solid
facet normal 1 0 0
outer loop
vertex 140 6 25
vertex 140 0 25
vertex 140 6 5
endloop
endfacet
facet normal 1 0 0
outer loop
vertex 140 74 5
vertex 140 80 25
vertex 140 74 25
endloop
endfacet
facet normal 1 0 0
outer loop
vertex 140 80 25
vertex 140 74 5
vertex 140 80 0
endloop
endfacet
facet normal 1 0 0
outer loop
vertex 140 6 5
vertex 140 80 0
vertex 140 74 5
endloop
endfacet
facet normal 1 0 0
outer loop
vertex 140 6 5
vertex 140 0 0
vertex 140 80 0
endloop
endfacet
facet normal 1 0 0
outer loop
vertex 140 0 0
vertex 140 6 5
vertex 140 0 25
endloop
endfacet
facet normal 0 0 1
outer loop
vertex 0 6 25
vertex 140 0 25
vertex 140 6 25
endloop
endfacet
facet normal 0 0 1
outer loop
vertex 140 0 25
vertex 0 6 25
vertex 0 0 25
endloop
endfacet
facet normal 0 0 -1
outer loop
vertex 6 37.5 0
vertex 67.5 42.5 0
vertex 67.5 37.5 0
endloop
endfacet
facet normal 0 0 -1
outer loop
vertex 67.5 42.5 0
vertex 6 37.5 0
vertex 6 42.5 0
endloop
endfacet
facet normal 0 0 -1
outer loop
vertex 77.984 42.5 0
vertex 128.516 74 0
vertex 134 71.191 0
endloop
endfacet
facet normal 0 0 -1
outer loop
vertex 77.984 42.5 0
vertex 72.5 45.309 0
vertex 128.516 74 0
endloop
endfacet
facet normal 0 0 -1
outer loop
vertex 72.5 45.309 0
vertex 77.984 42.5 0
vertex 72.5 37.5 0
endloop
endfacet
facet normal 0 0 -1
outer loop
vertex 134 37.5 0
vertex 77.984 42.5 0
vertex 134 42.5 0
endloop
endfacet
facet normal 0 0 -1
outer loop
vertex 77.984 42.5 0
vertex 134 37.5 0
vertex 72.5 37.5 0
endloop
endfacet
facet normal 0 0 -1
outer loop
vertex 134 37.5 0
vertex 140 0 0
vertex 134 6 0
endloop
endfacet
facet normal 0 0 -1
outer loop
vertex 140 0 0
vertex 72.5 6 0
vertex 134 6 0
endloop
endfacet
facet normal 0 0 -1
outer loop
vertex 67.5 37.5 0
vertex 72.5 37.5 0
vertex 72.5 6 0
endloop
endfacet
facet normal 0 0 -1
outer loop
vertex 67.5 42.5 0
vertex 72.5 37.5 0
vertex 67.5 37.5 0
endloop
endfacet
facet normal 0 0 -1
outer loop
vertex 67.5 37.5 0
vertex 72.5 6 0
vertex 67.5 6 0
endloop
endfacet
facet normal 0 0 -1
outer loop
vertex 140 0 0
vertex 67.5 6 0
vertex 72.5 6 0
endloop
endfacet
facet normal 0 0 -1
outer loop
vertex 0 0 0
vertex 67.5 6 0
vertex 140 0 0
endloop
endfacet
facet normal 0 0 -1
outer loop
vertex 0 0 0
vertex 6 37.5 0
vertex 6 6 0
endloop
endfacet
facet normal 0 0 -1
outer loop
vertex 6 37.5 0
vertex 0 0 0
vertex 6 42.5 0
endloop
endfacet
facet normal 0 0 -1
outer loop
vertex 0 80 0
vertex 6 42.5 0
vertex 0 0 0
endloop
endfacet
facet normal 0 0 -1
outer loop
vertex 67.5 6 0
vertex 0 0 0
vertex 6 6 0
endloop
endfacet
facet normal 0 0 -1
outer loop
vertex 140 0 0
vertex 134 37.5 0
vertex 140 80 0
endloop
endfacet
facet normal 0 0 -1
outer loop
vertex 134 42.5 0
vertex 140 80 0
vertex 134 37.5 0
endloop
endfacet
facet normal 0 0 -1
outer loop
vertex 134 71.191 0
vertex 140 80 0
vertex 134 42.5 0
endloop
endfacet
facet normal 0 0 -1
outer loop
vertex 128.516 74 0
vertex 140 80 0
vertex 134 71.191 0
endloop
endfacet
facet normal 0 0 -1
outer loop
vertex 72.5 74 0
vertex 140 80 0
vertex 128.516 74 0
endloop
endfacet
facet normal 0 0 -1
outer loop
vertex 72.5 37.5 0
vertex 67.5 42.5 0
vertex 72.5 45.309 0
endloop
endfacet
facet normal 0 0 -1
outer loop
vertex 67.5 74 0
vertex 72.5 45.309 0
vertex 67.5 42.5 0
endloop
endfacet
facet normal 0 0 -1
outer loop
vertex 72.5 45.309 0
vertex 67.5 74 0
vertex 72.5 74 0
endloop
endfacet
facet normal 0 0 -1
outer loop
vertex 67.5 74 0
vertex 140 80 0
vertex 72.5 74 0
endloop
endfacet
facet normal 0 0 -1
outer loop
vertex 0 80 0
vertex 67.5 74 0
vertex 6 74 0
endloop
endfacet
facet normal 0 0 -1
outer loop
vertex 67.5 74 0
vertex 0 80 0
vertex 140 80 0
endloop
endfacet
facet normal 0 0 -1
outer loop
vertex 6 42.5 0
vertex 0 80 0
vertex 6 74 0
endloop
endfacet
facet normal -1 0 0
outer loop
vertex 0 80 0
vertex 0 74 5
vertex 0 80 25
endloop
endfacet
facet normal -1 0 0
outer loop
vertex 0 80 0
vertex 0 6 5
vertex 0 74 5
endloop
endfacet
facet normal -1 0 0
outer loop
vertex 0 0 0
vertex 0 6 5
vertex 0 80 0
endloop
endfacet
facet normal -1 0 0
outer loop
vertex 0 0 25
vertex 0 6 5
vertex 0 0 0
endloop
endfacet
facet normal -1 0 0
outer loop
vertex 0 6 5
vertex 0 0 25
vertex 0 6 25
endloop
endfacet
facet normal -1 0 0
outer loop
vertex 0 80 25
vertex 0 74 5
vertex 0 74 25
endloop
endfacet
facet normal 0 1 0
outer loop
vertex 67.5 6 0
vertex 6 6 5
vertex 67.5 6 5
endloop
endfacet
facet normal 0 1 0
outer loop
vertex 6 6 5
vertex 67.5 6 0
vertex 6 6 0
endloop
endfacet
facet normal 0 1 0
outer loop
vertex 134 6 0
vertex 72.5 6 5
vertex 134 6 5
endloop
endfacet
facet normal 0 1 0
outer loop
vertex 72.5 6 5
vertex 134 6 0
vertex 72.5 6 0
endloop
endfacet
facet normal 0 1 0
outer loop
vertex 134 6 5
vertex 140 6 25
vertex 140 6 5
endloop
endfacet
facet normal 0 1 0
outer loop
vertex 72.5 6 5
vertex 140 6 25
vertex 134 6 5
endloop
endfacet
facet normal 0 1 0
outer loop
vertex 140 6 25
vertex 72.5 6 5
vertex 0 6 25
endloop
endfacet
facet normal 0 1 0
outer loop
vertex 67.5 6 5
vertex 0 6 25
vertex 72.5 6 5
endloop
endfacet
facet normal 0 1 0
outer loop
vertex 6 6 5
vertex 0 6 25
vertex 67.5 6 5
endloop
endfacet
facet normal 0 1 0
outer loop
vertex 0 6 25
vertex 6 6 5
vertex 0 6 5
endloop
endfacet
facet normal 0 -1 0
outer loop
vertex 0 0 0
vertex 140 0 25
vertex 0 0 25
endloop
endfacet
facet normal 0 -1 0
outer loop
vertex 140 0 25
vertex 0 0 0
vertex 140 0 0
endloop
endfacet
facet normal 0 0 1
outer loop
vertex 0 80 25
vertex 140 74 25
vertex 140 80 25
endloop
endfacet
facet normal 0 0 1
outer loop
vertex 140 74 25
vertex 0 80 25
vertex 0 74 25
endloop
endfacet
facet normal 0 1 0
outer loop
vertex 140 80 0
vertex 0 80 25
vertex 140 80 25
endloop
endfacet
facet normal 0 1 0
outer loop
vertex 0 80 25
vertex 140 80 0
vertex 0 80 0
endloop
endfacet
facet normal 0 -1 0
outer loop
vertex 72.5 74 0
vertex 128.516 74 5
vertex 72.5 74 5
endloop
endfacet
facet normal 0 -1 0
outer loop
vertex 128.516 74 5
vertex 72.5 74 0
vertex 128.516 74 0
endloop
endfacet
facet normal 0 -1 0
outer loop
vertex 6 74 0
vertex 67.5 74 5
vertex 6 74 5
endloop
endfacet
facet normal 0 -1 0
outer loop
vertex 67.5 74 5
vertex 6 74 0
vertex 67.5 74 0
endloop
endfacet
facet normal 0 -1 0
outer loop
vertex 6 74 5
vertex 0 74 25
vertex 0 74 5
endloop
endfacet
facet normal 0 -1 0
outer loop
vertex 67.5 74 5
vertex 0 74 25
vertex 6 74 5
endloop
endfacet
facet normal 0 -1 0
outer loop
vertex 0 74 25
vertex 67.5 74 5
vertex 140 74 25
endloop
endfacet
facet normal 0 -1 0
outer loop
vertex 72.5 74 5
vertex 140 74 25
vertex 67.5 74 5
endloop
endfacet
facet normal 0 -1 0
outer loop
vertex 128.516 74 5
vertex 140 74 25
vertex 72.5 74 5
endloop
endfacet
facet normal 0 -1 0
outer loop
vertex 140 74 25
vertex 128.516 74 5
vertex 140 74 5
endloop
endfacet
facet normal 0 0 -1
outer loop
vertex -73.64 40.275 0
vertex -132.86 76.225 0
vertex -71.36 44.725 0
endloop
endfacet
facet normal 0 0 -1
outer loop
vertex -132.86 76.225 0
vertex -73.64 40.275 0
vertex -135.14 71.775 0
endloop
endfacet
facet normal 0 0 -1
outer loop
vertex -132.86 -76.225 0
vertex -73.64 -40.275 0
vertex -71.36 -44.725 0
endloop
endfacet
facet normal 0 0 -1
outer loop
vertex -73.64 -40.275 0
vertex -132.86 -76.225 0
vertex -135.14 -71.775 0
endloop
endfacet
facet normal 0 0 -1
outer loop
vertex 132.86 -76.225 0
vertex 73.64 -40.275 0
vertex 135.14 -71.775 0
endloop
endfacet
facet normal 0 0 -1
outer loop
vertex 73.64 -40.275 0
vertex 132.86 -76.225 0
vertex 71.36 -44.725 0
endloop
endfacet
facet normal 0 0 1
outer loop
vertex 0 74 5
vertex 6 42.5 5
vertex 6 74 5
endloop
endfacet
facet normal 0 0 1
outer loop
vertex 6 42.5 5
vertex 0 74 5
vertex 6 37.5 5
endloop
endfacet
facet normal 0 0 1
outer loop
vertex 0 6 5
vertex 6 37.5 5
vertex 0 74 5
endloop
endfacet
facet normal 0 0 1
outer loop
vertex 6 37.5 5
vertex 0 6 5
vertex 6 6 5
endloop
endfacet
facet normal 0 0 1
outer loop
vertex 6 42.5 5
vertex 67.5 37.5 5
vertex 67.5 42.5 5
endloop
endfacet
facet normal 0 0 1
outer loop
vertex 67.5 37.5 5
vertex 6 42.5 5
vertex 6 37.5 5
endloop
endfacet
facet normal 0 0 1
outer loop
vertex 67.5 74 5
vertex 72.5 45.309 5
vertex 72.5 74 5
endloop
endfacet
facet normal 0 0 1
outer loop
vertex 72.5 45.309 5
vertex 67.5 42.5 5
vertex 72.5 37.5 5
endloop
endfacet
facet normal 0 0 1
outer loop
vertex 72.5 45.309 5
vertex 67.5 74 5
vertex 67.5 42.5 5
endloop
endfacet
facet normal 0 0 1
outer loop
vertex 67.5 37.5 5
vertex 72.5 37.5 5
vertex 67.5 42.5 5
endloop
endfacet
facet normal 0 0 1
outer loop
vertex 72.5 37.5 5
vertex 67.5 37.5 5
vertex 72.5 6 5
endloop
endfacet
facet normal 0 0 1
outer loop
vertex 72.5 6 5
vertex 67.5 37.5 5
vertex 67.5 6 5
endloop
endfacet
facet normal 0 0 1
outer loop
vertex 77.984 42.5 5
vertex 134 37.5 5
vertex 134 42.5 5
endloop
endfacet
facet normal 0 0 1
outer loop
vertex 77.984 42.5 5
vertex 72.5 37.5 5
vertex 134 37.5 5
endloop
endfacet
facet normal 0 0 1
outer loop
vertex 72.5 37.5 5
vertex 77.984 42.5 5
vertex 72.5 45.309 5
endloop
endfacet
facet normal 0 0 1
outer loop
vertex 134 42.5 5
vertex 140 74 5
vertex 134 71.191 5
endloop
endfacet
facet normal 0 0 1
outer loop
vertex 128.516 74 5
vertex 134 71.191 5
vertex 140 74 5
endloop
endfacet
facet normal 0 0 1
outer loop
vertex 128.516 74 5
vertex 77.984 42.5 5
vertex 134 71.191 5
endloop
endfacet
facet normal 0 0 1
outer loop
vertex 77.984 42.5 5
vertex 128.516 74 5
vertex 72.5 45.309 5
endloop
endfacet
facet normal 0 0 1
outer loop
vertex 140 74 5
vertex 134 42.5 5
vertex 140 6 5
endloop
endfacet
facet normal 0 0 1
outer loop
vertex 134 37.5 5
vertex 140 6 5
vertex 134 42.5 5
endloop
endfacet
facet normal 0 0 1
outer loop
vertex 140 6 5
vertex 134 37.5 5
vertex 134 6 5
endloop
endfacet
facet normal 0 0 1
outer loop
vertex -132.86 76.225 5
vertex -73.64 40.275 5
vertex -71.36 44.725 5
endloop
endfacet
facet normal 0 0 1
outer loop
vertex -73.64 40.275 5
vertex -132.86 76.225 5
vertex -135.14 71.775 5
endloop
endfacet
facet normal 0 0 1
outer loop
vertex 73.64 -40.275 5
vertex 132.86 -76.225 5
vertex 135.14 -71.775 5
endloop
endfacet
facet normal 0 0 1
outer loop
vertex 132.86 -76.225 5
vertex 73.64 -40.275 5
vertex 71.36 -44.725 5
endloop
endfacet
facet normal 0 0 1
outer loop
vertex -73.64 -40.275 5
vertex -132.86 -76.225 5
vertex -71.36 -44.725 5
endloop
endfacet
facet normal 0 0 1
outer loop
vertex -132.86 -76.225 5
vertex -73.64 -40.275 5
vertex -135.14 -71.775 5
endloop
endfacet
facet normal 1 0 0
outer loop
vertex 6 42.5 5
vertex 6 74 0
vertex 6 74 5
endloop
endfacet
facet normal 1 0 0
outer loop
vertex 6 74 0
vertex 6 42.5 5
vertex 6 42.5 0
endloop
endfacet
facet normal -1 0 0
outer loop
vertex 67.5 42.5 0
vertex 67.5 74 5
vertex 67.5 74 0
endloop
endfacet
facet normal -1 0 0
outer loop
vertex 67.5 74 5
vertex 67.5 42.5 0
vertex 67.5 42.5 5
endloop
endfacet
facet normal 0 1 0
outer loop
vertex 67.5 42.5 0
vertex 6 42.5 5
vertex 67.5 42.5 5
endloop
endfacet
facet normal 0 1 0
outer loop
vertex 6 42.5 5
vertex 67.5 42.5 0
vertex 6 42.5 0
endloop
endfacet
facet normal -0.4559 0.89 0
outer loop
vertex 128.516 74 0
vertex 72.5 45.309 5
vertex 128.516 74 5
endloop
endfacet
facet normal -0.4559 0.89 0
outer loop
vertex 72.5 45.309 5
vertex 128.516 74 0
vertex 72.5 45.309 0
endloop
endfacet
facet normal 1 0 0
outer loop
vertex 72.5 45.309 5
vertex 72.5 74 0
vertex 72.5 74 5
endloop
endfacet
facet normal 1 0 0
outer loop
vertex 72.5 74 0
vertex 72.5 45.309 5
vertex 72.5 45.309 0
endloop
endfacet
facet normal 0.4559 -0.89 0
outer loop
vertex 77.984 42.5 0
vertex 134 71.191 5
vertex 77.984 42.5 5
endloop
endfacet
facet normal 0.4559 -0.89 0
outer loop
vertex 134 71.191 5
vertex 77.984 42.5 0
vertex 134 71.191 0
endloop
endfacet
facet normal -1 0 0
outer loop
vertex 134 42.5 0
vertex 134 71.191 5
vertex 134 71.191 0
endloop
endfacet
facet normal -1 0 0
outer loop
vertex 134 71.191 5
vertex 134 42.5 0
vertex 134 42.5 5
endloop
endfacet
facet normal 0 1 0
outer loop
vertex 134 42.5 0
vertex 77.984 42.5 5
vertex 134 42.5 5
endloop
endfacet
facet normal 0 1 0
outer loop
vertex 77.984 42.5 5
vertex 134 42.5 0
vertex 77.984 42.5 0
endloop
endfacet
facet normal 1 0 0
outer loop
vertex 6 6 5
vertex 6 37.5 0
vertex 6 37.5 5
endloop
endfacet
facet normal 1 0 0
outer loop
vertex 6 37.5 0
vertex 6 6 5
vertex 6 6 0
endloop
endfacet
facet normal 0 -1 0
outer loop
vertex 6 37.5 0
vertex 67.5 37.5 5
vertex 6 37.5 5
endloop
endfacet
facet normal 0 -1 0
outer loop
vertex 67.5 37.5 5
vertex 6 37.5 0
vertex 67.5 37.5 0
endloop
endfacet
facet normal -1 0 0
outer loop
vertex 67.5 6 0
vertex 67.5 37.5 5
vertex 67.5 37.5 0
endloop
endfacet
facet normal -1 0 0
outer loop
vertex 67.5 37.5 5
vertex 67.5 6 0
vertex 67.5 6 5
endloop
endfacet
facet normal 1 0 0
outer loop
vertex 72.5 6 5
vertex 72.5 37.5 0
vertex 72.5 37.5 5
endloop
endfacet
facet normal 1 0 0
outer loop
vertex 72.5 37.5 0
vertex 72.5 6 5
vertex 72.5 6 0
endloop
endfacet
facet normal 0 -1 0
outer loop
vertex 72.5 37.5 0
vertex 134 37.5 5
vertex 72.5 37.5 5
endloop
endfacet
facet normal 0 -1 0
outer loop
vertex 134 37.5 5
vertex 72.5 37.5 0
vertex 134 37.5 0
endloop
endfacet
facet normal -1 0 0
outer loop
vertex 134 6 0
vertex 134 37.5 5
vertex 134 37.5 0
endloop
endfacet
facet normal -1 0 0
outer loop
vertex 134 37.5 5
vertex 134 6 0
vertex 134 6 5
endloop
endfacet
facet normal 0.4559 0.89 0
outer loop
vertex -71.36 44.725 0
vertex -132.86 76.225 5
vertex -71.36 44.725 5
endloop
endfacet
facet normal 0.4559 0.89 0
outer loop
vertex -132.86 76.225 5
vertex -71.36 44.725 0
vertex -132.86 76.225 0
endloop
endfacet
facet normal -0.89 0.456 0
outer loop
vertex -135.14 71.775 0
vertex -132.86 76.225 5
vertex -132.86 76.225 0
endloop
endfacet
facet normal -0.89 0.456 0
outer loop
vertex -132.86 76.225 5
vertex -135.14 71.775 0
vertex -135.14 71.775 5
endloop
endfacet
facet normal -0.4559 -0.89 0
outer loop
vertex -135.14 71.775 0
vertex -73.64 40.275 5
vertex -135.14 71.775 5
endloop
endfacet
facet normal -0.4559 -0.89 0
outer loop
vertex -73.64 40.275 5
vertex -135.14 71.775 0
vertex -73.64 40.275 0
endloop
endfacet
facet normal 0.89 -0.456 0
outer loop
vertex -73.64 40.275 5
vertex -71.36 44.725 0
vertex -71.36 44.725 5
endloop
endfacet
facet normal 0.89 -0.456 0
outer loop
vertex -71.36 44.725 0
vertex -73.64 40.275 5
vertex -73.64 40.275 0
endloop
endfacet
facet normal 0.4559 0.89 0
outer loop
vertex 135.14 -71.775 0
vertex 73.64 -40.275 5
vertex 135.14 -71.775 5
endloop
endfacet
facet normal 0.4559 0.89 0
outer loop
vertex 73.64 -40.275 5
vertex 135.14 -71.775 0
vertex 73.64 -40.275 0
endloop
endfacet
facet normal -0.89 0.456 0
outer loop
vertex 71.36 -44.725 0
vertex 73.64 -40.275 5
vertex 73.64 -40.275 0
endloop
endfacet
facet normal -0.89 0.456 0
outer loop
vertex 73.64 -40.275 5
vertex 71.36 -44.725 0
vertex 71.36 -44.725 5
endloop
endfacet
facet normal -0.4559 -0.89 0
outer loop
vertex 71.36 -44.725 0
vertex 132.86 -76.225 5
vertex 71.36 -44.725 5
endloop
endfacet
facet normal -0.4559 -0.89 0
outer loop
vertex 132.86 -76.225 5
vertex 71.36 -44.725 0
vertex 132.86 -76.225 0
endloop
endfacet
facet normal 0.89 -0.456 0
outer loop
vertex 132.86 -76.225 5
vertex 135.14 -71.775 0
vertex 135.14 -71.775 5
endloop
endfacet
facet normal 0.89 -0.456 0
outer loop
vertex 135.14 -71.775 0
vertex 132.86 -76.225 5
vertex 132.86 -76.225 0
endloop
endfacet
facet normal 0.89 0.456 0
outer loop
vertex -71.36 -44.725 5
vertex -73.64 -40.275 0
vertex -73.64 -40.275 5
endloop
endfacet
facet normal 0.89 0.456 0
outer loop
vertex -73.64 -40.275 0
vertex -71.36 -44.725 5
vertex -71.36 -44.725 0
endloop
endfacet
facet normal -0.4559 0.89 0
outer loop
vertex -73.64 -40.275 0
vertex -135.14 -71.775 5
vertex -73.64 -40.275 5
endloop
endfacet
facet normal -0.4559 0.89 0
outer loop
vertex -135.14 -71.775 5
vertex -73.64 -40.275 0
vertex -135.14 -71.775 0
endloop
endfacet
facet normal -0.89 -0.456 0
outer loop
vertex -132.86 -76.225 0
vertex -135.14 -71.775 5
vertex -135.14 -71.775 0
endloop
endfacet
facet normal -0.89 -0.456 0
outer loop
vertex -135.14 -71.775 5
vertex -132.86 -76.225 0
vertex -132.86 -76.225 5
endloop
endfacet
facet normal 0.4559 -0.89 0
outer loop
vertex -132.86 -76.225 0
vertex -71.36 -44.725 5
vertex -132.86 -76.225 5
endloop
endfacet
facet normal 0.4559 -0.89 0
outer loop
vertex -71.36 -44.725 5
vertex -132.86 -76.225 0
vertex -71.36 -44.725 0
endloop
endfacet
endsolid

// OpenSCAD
// ============================================================
// Open-Web Base Plate with Raised Side Walls
// A shallow lattice web (perimeter frame + cross + diagonal
// ribs, with circular openings) and two taller solid side
// walls along the long edges.
// ============================================================

// ---------------- Parameters ----------------
L        = 140;  // overall length of the web (X)
W        = 80;   // overall width of the web (Y)
t_web    = 5;    // web (rib) thickness in Z
frame    = 6;    // perimeter frame rib width
rib      = 5;    // internal cross-rib width
wall_t   = 6;    // side wall thickness
wall_h   = 25;   // side wall height (greater than web)
hole_d   = 14;   // diameter of circular openings
$fn      = 80;   // curve resolution

// Derived geometry for the quadrant layout
x_inner  = L/2 + rib/2;   // inner edge of central transverse rib
x_outer  = L - frame;     // inner edge of perimeter frame
y_inner  = W/2 + rib/2;   // inner edge of central longitudinal rib
y_outer  = W - frame;     // inner edge of perimeter frame
dx       = x_outer - x_inner;              // quadrant span in X
dy       = y_outer - y_inner;              // quadrant span in Y
diag_len = sqrt(dx*dx + dy*dy);            // diagonal rib length
diag_ang = atan2(dy, dx);                  // diagonal rib angle

// ---------------- 2D Web Profile ----------------
// Perimeter frame: outer rectangle minus inset rectangle
module perimeter_frame() {
    difference() {
        square([L, W]);
        translate([frame, frame])
            square([L - 2*frame, W - 2*frame]);
    }
}

// Diagonal rib in the +X/+Y quadrant (mirrored for the others)
module diagonal_rib() {
    mid = [(x_inner + x_outer)/2, (y_inner + y_outer)/2];
    translate(mid)
        rotate(diag_ang)
            square([diag_len, rib], center=true);
}

// Full web profile: frame + central cross ribs + 4 diagonals
module web_profile() {
    union() {
        perimeter_frame();
        // central longitudinal rib (along X)
        translate([0, W/2 - rib/2]) square([L, rib]);
        // central transverse rib (along Y)
        translate([L/2 - rib/2, 0]) square([rib, W]);
        // diagonal ribs in all four quadrants
        diagonal_rib();
        mirror([1, 0]) diagonal_rib();
        mirror([0, 1]) diagonal_rib();
        mirror([1, 0]) mirror([0, 1]) diagonal_rib();
    }
}

// ---------------- Circular Openings ----------------
// Through-holes at the center of each quadrant
module circular_openings() {
    cx = (x_inner + x_outer)/2;
    cy = (y_inner + y_outer)/2;
    for (sx = [-1, 1], sy = [-1, 1])
        translate([L/2 + sx*cx, W/2 + sy*cy, -1])
            cylinder(h = t_web + 2, d = hole_d);
}

// ---------------- Raised Side Walls ----------------
// Solid walls along the two long edges (Y = 0 and Y = W)
module side_walls() {
    translate([0, 0, 0])          cube([L, wall_t, wall_h]);
    translate([0, W - wall_t, 0]) cube([L, wall_t, wall_h]);
}

// ---------------- Assemble Part ----------------
difference() {
    union() {
        // shallow open web: extruded rib profile
        linear_extrude(height = t_web)
            web_profile();
        // tall side walls on the same base side
        side_walls();
    }
    // circular openings pass completely through the web
    circular_openings();
}
